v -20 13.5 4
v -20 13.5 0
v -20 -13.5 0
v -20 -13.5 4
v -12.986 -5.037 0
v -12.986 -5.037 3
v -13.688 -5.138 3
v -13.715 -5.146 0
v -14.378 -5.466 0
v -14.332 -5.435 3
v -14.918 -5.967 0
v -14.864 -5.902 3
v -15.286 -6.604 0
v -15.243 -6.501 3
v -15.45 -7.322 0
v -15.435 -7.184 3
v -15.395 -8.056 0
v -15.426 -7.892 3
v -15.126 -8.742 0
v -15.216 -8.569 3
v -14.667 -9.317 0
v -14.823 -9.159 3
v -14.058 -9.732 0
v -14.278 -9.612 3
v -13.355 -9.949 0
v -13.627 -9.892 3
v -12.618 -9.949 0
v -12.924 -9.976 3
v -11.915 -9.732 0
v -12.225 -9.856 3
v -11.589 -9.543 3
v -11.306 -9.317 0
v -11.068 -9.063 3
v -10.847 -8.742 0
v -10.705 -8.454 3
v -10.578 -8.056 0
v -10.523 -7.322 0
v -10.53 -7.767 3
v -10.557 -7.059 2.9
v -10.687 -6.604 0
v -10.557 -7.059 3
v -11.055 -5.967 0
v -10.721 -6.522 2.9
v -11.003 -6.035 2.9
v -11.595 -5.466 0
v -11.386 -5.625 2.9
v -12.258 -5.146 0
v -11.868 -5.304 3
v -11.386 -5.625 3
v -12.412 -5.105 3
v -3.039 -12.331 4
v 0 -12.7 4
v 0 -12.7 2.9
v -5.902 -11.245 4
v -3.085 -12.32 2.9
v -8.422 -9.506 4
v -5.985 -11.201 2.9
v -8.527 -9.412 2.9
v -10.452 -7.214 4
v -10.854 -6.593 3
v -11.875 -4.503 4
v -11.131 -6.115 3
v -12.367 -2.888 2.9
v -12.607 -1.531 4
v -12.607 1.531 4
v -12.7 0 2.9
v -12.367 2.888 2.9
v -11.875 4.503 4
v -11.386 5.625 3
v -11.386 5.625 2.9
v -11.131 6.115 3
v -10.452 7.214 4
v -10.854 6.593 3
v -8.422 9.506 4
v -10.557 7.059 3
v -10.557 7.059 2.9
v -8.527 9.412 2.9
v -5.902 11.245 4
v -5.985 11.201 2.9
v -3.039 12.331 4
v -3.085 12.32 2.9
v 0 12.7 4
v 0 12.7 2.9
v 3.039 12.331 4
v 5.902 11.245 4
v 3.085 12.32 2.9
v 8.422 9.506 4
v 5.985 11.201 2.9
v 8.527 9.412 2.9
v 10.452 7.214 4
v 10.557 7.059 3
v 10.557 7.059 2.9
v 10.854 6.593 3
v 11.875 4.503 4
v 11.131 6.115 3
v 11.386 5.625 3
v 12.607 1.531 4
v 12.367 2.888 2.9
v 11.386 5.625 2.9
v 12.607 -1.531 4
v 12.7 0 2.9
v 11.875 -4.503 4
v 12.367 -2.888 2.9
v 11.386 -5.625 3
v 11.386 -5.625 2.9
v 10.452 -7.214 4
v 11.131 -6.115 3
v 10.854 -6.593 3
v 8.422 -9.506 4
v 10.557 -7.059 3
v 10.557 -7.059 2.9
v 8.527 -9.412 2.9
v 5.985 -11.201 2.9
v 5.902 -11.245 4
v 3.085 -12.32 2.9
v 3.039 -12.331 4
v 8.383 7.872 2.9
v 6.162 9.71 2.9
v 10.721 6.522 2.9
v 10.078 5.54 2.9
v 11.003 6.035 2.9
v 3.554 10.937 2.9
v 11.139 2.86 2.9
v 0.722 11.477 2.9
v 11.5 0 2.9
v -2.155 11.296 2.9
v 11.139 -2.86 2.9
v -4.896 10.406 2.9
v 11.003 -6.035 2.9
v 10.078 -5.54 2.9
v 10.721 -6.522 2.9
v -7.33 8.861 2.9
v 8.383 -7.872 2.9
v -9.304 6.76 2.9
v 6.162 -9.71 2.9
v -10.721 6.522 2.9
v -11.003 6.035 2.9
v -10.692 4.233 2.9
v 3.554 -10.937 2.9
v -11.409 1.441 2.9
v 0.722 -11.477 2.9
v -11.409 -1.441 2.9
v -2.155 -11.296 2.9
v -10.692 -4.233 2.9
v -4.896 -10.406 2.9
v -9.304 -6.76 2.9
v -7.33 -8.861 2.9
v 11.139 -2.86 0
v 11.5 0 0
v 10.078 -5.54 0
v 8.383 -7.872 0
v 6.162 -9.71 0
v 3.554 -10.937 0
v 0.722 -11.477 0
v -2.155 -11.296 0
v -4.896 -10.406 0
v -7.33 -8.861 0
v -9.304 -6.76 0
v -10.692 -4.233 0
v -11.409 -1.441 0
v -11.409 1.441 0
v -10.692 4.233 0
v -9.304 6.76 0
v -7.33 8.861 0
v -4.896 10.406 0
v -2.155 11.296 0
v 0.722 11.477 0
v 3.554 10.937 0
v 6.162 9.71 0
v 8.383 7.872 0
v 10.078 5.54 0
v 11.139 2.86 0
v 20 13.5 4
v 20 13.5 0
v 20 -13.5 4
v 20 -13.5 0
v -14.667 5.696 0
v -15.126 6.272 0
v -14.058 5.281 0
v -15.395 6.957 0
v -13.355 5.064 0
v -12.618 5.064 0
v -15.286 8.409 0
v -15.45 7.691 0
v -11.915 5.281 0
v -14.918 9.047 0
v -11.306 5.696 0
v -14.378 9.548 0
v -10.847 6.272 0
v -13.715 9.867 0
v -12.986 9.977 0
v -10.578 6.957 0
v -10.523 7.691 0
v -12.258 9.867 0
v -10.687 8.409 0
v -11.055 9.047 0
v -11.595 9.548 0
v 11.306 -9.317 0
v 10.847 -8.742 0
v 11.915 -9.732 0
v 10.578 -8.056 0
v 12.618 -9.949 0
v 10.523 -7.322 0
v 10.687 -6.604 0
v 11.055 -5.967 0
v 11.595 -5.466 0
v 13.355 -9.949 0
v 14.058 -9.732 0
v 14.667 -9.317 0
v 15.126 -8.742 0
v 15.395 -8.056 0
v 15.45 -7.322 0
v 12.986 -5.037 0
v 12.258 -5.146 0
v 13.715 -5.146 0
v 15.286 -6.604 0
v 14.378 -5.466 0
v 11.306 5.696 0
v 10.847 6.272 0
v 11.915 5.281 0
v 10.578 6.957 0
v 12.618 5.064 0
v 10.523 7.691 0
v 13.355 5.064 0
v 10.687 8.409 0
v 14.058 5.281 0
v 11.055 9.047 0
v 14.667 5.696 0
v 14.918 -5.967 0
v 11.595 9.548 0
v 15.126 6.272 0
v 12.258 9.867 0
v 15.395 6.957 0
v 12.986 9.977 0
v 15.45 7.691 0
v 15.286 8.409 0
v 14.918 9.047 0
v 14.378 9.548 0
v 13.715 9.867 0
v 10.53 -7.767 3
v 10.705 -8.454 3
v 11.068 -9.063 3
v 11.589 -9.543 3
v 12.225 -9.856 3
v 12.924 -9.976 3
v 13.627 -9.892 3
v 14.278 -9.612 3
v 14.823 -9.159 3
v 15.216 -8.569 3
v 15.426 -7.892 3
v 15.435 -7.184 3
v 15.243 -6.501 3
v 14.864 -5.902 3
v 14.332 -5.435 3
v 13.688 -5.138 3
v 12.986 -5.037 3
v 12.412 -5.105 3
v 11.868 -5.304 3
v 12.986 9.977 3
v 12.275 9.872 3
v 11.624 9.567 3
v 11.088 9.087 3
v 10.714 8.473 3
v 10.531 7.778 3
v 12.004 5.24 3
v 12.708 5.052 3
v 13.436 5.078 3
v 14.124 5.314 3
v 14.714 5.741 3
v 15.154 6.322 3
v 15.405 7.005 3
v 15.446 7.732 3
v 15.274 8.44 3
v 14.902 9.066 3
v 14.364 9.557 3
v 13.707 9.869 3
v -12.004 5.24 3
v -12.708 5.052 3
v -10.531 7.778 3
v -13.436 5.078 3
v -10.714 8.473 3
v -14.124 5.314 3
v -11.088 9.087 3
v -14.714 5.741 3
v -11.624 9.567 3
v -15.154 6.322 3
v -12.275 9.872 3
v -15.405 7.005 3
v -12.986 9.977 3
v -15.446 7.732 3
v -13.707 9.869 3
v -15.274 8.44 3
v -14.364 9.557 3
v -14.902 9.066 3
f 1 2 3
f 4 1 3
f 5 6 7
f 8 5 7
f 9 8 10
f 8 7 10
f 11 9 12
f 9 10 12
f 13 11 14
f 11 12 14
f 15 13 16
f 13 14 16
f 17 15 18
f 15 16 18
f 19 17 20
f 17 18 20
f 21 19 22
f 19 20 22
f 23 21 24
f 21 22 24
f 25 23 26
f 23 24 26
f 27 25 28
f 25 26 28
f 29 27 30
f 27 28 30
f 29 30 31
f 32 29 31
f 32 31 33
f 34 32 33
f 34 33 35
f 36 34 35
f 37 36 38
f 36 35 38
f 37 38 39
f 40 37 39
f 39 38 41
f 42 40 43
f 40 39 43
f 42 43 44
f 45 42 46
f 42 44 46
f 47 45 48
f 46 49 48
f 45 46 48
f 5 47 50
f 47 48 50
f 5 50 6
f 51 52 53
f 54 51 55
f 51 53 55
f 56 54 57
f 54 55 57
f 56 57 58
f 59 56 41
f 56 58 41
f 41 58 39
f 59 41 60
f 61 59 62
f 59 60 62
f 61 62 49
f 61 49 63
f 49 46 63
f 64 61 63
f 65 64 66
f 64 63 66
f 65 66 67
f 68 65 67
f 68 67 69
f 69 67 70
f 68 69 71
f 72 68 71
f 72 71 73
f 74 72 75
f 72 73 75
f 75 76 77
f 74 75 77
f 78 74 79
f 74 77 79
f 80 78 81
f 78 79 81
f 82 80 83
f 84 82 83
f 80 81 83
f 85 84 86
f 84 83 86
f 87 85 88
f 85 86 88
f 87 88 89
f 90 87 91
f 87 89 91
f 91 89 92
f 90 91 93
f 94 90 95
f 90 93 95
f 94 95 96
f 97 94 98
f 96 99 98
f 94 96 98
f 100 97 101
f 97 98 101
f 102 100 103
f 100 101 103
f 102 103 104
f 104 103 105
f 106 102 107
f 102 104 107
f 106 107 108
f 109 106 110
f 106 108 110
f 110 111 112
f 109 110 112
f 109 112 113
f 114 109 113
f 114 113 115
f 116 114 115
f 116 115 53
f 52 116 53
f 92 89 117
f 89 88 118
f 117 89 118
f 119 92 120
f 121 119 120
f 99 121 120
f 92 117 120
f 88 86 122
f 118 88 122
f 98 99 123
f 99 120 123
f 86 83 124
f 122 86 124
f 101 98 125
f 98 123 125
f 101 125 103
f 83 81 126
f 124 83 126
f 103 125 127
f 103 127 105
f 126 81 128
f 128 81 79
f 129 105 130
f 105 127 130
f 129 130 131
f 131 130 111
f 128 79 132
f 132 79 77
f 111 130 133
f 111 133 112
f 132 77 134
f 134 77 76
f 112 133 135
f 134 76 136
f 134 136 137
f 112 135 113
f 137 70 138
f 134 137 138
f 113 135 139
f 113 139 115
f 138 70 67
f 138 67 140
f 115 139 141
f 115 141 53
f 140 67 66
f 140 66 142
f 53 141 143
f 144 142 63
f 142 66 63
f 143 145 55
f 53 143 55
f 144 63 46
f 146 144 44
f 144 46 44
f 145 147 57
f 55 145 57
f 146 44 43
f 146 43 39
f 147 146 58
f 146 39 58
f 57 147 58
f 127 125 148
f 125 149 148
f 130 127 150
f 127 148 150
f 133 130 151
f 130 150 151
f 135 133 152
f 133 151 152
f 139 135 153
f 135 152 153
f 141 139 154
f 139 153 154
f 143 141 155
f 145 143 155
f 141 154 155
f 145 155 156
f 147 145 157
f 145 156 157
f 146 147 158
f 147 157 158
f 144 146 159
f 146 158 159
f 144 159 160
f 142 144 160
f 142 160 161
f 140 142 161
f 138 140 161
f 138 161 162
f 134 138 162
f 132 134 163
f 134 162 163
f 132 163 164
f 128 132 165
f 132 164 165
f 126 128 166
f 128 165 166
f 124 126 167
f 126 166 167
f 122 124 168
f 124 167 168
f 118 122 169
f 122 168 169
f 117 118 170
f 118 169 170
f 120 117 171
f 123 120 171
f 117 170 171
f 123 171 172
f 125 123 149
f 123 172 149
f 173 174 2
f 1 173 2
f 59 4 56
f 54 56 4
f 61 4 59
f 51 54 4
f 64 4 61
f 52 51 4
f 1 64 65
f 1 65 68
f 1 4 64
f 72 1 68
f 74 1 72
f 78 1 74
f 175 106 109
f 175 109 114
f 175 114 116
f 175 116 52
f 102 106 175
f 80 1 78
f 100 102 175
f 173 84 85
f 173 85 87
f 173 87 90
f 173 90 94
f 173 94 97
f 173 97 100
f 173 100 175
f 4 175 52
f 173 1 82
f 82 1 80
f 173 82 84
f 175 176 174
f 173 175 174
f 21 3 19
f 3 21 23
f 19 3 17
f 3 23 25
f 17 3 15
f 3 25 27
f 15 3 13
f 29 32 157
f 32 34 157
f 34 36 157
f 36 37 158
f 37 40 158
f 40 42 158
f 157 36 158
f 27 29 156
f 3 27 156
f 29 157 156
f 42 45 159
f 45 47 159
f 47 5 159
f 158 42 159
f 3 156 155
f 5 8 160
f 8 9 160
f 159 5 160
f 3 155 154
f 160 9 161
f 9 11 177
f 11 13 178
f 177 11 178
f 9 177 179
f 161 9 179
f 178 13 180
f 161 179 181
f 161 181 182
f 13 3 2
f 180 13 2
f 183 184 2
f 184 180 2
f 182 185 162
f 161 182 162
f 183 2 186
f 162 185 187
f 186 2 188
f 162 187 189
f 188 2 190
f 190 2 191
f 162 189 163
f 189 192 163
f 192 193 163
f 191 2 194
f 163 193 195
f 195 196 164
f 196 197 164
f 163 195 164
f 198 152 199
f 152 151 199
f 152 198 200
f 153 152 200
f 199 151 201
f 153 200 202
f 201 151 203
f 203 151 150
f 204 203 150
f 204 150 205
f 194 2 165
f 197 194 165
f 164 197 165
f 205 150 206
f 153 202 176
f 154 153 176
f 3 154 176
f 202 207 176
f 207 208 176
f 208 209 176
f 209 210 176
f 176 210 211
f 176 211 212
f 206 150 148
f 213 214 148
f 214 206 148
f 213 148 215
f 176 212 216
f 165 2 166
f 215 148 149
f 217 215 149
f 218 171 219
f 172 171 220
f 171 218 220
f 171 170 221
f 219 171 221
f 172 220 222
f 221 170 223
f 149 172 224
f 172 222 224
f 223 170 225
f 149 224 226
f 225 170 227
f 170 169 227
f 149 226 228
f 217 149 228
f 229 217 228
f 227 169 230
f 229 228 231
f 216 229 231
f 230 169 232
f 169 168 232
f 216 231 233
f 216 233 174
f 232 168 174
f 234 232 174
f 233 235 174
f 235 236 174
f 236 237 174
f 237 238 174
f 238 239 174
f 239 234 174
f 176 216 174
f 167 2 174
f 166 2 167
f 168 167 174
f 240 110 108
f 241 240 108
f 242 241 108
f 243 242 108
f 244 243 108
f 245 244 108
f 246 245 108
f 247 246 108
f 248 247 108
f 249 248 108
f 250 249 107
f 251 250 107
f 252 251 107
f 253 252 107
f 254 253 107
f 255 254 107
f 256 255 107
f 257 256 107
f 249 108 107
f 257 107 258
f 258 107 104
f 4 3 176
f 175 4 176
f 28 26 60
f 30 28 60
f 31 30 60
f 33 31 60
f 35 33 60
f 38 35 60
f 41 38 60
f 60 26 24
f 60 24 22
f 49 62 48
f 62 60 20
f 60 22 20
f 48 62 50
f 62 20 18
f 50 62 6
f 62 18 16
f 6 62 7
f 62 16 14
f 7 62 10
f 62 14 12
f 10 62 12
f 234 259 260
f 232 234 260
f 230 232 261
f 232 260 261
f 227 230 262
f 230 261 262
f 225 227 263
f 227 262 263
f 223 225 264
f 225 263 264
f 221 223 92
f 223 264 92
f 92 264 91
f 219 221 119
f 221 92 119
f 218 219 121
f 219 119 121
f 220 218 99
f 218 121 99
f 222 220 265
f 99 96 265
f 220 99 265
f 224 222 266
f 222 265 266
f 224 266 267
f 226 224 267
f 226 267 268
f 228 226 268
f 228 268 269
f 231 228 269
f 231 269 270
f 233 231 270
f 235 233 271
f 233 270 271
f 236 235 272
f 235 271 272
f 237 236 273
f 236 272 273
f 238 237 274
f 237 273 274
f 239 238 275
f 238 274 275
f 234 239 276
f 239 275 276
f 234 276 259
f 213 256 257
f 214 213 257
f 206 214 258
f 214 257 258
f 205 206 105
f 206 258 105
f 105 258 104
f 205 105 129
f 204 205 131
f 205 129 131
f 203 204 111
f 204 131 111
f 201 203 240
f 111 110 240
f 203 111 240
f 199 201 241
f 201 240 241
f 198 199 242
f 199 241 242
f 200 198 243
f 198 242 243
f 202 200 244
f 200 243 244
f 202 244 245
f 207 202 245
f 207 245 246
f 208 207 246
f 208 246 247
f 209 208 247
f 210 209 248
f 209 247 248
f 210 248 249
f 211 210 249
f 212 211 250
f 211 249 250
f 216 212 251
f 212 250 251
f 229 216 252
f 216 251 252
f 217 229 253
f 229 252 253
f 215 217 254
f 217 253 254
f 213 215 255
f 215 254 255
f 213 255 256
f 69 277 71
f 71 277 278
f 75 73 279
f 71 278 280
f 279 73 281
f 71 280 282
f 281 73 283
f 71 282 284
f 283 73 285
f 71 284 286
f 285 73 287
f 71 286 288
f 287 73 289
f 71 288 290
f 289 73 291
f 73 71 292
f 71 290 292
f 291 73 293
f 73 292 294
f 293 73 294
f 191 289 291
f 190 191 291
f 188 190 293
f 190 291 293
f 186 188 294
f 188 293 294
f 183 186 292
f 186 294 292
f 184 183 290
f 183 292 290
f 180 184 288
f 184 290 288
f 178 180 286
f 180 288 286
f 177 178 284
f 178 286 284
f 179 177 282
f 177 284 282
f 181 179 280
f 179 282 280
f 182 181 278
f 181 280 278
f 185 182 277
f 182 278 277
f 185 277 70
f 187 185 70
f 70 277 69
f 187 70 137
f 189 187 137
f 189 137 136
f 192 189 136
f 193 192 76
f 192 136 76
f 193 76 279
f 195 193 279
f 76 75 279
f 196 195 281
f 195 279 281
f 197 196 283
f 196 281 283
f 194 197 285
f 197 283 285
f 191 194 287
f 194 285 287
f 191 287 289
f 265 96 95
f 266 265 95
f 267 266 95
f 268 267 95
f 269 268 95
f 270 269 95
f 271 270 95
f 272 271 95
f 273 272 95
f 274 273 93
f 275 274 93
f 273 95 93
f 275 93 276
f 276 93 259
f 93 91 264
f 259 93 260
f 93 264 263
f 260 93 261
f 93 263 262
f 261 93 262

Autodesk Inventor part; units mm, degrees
ref_plane "YZ Plane" through (0, 0, 0) normal (1, 0, 0) x (0, 1, 0)
ref_plane "XZ Plane" through (0, 0, 0) normal (0, 1, 0) x (-1, 0, 0)
ref_plane "XY Plane" through (0, 0, 0) normal (0, 0, 1) x (1, 0, 0)
sketch "草图1" plane through (0, 0, 0) normal (0, 0, 1) x (1, 0, 0)
  line L0 (-25.95, -15) -> (25.95, -15) construction
  line L1 (25.95, -15) -> (25.95, 15) construction
  line L2 (25.95, 15) -> (-25.95, 15) construction
  line L3 (-25.95, 15) -> (-25.95, -15) construction
  line L4 (-25.95, -15) -> (25.95, 15) construction
  line L5 (25.95, -15) -> (-25.95, 15) construction
  line L6 (0, 0) -> (-12.9865, 7.5067) construction
  line L7 (0, 0) -> (12.9865, 7.5067) construction
  line L8 (0, 0) -> (-12.9865, -7.5067) construction
  line L9 (0, 0) -> (12.9865, -7.5067) construction
  circle A0 centre (0, 0) radius 11.5
  line L10 (-20, -13.5) -> (20, -13.5)
  line L11 (20, -13.5) -> (20, 13.5)
  line L12 (20, 13.5) -> (-20, 13.5)
  line L13 (-20, 13.5) -> (-20, -13.5)
  line L14 (-20, -13.5) -> (20, 13.5) construction
  line L15 (20, -13.5) -> (-20, 13.5) construction
  circle A1 centre (12.9865, 7.5067) radius 2.5
  circle A2 centre (-12.9865, 7.5067) radius 2.5
  circle A3 centre (12.9865, -7.5067) radius 2.5
  dimension "d0" = 51.9
  dimension "d1" = 30
  dimension "d6" = 23
  dimension "d7" = 40
  dimension "d8" = 27
  dimension "d11" = 5
  dimension "d12" = 5
  dimension "d13" = 5
extrude "拉伸1" add sketch "草图1" along normal blind 4 contours L13 L12 L11 L10 | A1 | A2 | A3
hole "孔1" at (-12.9865, 7.5067, 0) at (12.9865, 7.5067, 0) at (12.9865, -7.5067, 0) at (-12.9865, -7.5067, 0) at (0, 0, 0) direction (0, 0, 1) diameter 4.94 depth 3
sketch "草图2" plane through (0, 0, 4) normal (0, 0, 1) x (1, 0, 0)
  point P0 (0, 0)
  point P1 (0, 0)
hole "孔2" at (0, 0, 4) direction (0, 0, -1) diameter 25.4 depth 1.1
sketch "草图3" plane through (0, 0, 4) normal (0, 0, 1) x (1, 0, 0)
  point P0 (0, 0)
equation "\"折弯半径\" = 厚度"
equation "\"折弯释压宽度\" = 厚度"
equation "\"折弯释压深度\" = 0.5 * 厚度"
equation "\"拐角释压尺寸\" = 4 * 厚度"
equation "\"最小余量\" = 2 * 厚度"
equation "\"过渡半径\" = 折弯半径"
equation "\"Jacobi半径尺寸\" = 折弯半径"
equation "\"间隙大小\" = 厚度"
equation "\"厚度\" = 0.5"
properties part number "zhunzhiguan2"
